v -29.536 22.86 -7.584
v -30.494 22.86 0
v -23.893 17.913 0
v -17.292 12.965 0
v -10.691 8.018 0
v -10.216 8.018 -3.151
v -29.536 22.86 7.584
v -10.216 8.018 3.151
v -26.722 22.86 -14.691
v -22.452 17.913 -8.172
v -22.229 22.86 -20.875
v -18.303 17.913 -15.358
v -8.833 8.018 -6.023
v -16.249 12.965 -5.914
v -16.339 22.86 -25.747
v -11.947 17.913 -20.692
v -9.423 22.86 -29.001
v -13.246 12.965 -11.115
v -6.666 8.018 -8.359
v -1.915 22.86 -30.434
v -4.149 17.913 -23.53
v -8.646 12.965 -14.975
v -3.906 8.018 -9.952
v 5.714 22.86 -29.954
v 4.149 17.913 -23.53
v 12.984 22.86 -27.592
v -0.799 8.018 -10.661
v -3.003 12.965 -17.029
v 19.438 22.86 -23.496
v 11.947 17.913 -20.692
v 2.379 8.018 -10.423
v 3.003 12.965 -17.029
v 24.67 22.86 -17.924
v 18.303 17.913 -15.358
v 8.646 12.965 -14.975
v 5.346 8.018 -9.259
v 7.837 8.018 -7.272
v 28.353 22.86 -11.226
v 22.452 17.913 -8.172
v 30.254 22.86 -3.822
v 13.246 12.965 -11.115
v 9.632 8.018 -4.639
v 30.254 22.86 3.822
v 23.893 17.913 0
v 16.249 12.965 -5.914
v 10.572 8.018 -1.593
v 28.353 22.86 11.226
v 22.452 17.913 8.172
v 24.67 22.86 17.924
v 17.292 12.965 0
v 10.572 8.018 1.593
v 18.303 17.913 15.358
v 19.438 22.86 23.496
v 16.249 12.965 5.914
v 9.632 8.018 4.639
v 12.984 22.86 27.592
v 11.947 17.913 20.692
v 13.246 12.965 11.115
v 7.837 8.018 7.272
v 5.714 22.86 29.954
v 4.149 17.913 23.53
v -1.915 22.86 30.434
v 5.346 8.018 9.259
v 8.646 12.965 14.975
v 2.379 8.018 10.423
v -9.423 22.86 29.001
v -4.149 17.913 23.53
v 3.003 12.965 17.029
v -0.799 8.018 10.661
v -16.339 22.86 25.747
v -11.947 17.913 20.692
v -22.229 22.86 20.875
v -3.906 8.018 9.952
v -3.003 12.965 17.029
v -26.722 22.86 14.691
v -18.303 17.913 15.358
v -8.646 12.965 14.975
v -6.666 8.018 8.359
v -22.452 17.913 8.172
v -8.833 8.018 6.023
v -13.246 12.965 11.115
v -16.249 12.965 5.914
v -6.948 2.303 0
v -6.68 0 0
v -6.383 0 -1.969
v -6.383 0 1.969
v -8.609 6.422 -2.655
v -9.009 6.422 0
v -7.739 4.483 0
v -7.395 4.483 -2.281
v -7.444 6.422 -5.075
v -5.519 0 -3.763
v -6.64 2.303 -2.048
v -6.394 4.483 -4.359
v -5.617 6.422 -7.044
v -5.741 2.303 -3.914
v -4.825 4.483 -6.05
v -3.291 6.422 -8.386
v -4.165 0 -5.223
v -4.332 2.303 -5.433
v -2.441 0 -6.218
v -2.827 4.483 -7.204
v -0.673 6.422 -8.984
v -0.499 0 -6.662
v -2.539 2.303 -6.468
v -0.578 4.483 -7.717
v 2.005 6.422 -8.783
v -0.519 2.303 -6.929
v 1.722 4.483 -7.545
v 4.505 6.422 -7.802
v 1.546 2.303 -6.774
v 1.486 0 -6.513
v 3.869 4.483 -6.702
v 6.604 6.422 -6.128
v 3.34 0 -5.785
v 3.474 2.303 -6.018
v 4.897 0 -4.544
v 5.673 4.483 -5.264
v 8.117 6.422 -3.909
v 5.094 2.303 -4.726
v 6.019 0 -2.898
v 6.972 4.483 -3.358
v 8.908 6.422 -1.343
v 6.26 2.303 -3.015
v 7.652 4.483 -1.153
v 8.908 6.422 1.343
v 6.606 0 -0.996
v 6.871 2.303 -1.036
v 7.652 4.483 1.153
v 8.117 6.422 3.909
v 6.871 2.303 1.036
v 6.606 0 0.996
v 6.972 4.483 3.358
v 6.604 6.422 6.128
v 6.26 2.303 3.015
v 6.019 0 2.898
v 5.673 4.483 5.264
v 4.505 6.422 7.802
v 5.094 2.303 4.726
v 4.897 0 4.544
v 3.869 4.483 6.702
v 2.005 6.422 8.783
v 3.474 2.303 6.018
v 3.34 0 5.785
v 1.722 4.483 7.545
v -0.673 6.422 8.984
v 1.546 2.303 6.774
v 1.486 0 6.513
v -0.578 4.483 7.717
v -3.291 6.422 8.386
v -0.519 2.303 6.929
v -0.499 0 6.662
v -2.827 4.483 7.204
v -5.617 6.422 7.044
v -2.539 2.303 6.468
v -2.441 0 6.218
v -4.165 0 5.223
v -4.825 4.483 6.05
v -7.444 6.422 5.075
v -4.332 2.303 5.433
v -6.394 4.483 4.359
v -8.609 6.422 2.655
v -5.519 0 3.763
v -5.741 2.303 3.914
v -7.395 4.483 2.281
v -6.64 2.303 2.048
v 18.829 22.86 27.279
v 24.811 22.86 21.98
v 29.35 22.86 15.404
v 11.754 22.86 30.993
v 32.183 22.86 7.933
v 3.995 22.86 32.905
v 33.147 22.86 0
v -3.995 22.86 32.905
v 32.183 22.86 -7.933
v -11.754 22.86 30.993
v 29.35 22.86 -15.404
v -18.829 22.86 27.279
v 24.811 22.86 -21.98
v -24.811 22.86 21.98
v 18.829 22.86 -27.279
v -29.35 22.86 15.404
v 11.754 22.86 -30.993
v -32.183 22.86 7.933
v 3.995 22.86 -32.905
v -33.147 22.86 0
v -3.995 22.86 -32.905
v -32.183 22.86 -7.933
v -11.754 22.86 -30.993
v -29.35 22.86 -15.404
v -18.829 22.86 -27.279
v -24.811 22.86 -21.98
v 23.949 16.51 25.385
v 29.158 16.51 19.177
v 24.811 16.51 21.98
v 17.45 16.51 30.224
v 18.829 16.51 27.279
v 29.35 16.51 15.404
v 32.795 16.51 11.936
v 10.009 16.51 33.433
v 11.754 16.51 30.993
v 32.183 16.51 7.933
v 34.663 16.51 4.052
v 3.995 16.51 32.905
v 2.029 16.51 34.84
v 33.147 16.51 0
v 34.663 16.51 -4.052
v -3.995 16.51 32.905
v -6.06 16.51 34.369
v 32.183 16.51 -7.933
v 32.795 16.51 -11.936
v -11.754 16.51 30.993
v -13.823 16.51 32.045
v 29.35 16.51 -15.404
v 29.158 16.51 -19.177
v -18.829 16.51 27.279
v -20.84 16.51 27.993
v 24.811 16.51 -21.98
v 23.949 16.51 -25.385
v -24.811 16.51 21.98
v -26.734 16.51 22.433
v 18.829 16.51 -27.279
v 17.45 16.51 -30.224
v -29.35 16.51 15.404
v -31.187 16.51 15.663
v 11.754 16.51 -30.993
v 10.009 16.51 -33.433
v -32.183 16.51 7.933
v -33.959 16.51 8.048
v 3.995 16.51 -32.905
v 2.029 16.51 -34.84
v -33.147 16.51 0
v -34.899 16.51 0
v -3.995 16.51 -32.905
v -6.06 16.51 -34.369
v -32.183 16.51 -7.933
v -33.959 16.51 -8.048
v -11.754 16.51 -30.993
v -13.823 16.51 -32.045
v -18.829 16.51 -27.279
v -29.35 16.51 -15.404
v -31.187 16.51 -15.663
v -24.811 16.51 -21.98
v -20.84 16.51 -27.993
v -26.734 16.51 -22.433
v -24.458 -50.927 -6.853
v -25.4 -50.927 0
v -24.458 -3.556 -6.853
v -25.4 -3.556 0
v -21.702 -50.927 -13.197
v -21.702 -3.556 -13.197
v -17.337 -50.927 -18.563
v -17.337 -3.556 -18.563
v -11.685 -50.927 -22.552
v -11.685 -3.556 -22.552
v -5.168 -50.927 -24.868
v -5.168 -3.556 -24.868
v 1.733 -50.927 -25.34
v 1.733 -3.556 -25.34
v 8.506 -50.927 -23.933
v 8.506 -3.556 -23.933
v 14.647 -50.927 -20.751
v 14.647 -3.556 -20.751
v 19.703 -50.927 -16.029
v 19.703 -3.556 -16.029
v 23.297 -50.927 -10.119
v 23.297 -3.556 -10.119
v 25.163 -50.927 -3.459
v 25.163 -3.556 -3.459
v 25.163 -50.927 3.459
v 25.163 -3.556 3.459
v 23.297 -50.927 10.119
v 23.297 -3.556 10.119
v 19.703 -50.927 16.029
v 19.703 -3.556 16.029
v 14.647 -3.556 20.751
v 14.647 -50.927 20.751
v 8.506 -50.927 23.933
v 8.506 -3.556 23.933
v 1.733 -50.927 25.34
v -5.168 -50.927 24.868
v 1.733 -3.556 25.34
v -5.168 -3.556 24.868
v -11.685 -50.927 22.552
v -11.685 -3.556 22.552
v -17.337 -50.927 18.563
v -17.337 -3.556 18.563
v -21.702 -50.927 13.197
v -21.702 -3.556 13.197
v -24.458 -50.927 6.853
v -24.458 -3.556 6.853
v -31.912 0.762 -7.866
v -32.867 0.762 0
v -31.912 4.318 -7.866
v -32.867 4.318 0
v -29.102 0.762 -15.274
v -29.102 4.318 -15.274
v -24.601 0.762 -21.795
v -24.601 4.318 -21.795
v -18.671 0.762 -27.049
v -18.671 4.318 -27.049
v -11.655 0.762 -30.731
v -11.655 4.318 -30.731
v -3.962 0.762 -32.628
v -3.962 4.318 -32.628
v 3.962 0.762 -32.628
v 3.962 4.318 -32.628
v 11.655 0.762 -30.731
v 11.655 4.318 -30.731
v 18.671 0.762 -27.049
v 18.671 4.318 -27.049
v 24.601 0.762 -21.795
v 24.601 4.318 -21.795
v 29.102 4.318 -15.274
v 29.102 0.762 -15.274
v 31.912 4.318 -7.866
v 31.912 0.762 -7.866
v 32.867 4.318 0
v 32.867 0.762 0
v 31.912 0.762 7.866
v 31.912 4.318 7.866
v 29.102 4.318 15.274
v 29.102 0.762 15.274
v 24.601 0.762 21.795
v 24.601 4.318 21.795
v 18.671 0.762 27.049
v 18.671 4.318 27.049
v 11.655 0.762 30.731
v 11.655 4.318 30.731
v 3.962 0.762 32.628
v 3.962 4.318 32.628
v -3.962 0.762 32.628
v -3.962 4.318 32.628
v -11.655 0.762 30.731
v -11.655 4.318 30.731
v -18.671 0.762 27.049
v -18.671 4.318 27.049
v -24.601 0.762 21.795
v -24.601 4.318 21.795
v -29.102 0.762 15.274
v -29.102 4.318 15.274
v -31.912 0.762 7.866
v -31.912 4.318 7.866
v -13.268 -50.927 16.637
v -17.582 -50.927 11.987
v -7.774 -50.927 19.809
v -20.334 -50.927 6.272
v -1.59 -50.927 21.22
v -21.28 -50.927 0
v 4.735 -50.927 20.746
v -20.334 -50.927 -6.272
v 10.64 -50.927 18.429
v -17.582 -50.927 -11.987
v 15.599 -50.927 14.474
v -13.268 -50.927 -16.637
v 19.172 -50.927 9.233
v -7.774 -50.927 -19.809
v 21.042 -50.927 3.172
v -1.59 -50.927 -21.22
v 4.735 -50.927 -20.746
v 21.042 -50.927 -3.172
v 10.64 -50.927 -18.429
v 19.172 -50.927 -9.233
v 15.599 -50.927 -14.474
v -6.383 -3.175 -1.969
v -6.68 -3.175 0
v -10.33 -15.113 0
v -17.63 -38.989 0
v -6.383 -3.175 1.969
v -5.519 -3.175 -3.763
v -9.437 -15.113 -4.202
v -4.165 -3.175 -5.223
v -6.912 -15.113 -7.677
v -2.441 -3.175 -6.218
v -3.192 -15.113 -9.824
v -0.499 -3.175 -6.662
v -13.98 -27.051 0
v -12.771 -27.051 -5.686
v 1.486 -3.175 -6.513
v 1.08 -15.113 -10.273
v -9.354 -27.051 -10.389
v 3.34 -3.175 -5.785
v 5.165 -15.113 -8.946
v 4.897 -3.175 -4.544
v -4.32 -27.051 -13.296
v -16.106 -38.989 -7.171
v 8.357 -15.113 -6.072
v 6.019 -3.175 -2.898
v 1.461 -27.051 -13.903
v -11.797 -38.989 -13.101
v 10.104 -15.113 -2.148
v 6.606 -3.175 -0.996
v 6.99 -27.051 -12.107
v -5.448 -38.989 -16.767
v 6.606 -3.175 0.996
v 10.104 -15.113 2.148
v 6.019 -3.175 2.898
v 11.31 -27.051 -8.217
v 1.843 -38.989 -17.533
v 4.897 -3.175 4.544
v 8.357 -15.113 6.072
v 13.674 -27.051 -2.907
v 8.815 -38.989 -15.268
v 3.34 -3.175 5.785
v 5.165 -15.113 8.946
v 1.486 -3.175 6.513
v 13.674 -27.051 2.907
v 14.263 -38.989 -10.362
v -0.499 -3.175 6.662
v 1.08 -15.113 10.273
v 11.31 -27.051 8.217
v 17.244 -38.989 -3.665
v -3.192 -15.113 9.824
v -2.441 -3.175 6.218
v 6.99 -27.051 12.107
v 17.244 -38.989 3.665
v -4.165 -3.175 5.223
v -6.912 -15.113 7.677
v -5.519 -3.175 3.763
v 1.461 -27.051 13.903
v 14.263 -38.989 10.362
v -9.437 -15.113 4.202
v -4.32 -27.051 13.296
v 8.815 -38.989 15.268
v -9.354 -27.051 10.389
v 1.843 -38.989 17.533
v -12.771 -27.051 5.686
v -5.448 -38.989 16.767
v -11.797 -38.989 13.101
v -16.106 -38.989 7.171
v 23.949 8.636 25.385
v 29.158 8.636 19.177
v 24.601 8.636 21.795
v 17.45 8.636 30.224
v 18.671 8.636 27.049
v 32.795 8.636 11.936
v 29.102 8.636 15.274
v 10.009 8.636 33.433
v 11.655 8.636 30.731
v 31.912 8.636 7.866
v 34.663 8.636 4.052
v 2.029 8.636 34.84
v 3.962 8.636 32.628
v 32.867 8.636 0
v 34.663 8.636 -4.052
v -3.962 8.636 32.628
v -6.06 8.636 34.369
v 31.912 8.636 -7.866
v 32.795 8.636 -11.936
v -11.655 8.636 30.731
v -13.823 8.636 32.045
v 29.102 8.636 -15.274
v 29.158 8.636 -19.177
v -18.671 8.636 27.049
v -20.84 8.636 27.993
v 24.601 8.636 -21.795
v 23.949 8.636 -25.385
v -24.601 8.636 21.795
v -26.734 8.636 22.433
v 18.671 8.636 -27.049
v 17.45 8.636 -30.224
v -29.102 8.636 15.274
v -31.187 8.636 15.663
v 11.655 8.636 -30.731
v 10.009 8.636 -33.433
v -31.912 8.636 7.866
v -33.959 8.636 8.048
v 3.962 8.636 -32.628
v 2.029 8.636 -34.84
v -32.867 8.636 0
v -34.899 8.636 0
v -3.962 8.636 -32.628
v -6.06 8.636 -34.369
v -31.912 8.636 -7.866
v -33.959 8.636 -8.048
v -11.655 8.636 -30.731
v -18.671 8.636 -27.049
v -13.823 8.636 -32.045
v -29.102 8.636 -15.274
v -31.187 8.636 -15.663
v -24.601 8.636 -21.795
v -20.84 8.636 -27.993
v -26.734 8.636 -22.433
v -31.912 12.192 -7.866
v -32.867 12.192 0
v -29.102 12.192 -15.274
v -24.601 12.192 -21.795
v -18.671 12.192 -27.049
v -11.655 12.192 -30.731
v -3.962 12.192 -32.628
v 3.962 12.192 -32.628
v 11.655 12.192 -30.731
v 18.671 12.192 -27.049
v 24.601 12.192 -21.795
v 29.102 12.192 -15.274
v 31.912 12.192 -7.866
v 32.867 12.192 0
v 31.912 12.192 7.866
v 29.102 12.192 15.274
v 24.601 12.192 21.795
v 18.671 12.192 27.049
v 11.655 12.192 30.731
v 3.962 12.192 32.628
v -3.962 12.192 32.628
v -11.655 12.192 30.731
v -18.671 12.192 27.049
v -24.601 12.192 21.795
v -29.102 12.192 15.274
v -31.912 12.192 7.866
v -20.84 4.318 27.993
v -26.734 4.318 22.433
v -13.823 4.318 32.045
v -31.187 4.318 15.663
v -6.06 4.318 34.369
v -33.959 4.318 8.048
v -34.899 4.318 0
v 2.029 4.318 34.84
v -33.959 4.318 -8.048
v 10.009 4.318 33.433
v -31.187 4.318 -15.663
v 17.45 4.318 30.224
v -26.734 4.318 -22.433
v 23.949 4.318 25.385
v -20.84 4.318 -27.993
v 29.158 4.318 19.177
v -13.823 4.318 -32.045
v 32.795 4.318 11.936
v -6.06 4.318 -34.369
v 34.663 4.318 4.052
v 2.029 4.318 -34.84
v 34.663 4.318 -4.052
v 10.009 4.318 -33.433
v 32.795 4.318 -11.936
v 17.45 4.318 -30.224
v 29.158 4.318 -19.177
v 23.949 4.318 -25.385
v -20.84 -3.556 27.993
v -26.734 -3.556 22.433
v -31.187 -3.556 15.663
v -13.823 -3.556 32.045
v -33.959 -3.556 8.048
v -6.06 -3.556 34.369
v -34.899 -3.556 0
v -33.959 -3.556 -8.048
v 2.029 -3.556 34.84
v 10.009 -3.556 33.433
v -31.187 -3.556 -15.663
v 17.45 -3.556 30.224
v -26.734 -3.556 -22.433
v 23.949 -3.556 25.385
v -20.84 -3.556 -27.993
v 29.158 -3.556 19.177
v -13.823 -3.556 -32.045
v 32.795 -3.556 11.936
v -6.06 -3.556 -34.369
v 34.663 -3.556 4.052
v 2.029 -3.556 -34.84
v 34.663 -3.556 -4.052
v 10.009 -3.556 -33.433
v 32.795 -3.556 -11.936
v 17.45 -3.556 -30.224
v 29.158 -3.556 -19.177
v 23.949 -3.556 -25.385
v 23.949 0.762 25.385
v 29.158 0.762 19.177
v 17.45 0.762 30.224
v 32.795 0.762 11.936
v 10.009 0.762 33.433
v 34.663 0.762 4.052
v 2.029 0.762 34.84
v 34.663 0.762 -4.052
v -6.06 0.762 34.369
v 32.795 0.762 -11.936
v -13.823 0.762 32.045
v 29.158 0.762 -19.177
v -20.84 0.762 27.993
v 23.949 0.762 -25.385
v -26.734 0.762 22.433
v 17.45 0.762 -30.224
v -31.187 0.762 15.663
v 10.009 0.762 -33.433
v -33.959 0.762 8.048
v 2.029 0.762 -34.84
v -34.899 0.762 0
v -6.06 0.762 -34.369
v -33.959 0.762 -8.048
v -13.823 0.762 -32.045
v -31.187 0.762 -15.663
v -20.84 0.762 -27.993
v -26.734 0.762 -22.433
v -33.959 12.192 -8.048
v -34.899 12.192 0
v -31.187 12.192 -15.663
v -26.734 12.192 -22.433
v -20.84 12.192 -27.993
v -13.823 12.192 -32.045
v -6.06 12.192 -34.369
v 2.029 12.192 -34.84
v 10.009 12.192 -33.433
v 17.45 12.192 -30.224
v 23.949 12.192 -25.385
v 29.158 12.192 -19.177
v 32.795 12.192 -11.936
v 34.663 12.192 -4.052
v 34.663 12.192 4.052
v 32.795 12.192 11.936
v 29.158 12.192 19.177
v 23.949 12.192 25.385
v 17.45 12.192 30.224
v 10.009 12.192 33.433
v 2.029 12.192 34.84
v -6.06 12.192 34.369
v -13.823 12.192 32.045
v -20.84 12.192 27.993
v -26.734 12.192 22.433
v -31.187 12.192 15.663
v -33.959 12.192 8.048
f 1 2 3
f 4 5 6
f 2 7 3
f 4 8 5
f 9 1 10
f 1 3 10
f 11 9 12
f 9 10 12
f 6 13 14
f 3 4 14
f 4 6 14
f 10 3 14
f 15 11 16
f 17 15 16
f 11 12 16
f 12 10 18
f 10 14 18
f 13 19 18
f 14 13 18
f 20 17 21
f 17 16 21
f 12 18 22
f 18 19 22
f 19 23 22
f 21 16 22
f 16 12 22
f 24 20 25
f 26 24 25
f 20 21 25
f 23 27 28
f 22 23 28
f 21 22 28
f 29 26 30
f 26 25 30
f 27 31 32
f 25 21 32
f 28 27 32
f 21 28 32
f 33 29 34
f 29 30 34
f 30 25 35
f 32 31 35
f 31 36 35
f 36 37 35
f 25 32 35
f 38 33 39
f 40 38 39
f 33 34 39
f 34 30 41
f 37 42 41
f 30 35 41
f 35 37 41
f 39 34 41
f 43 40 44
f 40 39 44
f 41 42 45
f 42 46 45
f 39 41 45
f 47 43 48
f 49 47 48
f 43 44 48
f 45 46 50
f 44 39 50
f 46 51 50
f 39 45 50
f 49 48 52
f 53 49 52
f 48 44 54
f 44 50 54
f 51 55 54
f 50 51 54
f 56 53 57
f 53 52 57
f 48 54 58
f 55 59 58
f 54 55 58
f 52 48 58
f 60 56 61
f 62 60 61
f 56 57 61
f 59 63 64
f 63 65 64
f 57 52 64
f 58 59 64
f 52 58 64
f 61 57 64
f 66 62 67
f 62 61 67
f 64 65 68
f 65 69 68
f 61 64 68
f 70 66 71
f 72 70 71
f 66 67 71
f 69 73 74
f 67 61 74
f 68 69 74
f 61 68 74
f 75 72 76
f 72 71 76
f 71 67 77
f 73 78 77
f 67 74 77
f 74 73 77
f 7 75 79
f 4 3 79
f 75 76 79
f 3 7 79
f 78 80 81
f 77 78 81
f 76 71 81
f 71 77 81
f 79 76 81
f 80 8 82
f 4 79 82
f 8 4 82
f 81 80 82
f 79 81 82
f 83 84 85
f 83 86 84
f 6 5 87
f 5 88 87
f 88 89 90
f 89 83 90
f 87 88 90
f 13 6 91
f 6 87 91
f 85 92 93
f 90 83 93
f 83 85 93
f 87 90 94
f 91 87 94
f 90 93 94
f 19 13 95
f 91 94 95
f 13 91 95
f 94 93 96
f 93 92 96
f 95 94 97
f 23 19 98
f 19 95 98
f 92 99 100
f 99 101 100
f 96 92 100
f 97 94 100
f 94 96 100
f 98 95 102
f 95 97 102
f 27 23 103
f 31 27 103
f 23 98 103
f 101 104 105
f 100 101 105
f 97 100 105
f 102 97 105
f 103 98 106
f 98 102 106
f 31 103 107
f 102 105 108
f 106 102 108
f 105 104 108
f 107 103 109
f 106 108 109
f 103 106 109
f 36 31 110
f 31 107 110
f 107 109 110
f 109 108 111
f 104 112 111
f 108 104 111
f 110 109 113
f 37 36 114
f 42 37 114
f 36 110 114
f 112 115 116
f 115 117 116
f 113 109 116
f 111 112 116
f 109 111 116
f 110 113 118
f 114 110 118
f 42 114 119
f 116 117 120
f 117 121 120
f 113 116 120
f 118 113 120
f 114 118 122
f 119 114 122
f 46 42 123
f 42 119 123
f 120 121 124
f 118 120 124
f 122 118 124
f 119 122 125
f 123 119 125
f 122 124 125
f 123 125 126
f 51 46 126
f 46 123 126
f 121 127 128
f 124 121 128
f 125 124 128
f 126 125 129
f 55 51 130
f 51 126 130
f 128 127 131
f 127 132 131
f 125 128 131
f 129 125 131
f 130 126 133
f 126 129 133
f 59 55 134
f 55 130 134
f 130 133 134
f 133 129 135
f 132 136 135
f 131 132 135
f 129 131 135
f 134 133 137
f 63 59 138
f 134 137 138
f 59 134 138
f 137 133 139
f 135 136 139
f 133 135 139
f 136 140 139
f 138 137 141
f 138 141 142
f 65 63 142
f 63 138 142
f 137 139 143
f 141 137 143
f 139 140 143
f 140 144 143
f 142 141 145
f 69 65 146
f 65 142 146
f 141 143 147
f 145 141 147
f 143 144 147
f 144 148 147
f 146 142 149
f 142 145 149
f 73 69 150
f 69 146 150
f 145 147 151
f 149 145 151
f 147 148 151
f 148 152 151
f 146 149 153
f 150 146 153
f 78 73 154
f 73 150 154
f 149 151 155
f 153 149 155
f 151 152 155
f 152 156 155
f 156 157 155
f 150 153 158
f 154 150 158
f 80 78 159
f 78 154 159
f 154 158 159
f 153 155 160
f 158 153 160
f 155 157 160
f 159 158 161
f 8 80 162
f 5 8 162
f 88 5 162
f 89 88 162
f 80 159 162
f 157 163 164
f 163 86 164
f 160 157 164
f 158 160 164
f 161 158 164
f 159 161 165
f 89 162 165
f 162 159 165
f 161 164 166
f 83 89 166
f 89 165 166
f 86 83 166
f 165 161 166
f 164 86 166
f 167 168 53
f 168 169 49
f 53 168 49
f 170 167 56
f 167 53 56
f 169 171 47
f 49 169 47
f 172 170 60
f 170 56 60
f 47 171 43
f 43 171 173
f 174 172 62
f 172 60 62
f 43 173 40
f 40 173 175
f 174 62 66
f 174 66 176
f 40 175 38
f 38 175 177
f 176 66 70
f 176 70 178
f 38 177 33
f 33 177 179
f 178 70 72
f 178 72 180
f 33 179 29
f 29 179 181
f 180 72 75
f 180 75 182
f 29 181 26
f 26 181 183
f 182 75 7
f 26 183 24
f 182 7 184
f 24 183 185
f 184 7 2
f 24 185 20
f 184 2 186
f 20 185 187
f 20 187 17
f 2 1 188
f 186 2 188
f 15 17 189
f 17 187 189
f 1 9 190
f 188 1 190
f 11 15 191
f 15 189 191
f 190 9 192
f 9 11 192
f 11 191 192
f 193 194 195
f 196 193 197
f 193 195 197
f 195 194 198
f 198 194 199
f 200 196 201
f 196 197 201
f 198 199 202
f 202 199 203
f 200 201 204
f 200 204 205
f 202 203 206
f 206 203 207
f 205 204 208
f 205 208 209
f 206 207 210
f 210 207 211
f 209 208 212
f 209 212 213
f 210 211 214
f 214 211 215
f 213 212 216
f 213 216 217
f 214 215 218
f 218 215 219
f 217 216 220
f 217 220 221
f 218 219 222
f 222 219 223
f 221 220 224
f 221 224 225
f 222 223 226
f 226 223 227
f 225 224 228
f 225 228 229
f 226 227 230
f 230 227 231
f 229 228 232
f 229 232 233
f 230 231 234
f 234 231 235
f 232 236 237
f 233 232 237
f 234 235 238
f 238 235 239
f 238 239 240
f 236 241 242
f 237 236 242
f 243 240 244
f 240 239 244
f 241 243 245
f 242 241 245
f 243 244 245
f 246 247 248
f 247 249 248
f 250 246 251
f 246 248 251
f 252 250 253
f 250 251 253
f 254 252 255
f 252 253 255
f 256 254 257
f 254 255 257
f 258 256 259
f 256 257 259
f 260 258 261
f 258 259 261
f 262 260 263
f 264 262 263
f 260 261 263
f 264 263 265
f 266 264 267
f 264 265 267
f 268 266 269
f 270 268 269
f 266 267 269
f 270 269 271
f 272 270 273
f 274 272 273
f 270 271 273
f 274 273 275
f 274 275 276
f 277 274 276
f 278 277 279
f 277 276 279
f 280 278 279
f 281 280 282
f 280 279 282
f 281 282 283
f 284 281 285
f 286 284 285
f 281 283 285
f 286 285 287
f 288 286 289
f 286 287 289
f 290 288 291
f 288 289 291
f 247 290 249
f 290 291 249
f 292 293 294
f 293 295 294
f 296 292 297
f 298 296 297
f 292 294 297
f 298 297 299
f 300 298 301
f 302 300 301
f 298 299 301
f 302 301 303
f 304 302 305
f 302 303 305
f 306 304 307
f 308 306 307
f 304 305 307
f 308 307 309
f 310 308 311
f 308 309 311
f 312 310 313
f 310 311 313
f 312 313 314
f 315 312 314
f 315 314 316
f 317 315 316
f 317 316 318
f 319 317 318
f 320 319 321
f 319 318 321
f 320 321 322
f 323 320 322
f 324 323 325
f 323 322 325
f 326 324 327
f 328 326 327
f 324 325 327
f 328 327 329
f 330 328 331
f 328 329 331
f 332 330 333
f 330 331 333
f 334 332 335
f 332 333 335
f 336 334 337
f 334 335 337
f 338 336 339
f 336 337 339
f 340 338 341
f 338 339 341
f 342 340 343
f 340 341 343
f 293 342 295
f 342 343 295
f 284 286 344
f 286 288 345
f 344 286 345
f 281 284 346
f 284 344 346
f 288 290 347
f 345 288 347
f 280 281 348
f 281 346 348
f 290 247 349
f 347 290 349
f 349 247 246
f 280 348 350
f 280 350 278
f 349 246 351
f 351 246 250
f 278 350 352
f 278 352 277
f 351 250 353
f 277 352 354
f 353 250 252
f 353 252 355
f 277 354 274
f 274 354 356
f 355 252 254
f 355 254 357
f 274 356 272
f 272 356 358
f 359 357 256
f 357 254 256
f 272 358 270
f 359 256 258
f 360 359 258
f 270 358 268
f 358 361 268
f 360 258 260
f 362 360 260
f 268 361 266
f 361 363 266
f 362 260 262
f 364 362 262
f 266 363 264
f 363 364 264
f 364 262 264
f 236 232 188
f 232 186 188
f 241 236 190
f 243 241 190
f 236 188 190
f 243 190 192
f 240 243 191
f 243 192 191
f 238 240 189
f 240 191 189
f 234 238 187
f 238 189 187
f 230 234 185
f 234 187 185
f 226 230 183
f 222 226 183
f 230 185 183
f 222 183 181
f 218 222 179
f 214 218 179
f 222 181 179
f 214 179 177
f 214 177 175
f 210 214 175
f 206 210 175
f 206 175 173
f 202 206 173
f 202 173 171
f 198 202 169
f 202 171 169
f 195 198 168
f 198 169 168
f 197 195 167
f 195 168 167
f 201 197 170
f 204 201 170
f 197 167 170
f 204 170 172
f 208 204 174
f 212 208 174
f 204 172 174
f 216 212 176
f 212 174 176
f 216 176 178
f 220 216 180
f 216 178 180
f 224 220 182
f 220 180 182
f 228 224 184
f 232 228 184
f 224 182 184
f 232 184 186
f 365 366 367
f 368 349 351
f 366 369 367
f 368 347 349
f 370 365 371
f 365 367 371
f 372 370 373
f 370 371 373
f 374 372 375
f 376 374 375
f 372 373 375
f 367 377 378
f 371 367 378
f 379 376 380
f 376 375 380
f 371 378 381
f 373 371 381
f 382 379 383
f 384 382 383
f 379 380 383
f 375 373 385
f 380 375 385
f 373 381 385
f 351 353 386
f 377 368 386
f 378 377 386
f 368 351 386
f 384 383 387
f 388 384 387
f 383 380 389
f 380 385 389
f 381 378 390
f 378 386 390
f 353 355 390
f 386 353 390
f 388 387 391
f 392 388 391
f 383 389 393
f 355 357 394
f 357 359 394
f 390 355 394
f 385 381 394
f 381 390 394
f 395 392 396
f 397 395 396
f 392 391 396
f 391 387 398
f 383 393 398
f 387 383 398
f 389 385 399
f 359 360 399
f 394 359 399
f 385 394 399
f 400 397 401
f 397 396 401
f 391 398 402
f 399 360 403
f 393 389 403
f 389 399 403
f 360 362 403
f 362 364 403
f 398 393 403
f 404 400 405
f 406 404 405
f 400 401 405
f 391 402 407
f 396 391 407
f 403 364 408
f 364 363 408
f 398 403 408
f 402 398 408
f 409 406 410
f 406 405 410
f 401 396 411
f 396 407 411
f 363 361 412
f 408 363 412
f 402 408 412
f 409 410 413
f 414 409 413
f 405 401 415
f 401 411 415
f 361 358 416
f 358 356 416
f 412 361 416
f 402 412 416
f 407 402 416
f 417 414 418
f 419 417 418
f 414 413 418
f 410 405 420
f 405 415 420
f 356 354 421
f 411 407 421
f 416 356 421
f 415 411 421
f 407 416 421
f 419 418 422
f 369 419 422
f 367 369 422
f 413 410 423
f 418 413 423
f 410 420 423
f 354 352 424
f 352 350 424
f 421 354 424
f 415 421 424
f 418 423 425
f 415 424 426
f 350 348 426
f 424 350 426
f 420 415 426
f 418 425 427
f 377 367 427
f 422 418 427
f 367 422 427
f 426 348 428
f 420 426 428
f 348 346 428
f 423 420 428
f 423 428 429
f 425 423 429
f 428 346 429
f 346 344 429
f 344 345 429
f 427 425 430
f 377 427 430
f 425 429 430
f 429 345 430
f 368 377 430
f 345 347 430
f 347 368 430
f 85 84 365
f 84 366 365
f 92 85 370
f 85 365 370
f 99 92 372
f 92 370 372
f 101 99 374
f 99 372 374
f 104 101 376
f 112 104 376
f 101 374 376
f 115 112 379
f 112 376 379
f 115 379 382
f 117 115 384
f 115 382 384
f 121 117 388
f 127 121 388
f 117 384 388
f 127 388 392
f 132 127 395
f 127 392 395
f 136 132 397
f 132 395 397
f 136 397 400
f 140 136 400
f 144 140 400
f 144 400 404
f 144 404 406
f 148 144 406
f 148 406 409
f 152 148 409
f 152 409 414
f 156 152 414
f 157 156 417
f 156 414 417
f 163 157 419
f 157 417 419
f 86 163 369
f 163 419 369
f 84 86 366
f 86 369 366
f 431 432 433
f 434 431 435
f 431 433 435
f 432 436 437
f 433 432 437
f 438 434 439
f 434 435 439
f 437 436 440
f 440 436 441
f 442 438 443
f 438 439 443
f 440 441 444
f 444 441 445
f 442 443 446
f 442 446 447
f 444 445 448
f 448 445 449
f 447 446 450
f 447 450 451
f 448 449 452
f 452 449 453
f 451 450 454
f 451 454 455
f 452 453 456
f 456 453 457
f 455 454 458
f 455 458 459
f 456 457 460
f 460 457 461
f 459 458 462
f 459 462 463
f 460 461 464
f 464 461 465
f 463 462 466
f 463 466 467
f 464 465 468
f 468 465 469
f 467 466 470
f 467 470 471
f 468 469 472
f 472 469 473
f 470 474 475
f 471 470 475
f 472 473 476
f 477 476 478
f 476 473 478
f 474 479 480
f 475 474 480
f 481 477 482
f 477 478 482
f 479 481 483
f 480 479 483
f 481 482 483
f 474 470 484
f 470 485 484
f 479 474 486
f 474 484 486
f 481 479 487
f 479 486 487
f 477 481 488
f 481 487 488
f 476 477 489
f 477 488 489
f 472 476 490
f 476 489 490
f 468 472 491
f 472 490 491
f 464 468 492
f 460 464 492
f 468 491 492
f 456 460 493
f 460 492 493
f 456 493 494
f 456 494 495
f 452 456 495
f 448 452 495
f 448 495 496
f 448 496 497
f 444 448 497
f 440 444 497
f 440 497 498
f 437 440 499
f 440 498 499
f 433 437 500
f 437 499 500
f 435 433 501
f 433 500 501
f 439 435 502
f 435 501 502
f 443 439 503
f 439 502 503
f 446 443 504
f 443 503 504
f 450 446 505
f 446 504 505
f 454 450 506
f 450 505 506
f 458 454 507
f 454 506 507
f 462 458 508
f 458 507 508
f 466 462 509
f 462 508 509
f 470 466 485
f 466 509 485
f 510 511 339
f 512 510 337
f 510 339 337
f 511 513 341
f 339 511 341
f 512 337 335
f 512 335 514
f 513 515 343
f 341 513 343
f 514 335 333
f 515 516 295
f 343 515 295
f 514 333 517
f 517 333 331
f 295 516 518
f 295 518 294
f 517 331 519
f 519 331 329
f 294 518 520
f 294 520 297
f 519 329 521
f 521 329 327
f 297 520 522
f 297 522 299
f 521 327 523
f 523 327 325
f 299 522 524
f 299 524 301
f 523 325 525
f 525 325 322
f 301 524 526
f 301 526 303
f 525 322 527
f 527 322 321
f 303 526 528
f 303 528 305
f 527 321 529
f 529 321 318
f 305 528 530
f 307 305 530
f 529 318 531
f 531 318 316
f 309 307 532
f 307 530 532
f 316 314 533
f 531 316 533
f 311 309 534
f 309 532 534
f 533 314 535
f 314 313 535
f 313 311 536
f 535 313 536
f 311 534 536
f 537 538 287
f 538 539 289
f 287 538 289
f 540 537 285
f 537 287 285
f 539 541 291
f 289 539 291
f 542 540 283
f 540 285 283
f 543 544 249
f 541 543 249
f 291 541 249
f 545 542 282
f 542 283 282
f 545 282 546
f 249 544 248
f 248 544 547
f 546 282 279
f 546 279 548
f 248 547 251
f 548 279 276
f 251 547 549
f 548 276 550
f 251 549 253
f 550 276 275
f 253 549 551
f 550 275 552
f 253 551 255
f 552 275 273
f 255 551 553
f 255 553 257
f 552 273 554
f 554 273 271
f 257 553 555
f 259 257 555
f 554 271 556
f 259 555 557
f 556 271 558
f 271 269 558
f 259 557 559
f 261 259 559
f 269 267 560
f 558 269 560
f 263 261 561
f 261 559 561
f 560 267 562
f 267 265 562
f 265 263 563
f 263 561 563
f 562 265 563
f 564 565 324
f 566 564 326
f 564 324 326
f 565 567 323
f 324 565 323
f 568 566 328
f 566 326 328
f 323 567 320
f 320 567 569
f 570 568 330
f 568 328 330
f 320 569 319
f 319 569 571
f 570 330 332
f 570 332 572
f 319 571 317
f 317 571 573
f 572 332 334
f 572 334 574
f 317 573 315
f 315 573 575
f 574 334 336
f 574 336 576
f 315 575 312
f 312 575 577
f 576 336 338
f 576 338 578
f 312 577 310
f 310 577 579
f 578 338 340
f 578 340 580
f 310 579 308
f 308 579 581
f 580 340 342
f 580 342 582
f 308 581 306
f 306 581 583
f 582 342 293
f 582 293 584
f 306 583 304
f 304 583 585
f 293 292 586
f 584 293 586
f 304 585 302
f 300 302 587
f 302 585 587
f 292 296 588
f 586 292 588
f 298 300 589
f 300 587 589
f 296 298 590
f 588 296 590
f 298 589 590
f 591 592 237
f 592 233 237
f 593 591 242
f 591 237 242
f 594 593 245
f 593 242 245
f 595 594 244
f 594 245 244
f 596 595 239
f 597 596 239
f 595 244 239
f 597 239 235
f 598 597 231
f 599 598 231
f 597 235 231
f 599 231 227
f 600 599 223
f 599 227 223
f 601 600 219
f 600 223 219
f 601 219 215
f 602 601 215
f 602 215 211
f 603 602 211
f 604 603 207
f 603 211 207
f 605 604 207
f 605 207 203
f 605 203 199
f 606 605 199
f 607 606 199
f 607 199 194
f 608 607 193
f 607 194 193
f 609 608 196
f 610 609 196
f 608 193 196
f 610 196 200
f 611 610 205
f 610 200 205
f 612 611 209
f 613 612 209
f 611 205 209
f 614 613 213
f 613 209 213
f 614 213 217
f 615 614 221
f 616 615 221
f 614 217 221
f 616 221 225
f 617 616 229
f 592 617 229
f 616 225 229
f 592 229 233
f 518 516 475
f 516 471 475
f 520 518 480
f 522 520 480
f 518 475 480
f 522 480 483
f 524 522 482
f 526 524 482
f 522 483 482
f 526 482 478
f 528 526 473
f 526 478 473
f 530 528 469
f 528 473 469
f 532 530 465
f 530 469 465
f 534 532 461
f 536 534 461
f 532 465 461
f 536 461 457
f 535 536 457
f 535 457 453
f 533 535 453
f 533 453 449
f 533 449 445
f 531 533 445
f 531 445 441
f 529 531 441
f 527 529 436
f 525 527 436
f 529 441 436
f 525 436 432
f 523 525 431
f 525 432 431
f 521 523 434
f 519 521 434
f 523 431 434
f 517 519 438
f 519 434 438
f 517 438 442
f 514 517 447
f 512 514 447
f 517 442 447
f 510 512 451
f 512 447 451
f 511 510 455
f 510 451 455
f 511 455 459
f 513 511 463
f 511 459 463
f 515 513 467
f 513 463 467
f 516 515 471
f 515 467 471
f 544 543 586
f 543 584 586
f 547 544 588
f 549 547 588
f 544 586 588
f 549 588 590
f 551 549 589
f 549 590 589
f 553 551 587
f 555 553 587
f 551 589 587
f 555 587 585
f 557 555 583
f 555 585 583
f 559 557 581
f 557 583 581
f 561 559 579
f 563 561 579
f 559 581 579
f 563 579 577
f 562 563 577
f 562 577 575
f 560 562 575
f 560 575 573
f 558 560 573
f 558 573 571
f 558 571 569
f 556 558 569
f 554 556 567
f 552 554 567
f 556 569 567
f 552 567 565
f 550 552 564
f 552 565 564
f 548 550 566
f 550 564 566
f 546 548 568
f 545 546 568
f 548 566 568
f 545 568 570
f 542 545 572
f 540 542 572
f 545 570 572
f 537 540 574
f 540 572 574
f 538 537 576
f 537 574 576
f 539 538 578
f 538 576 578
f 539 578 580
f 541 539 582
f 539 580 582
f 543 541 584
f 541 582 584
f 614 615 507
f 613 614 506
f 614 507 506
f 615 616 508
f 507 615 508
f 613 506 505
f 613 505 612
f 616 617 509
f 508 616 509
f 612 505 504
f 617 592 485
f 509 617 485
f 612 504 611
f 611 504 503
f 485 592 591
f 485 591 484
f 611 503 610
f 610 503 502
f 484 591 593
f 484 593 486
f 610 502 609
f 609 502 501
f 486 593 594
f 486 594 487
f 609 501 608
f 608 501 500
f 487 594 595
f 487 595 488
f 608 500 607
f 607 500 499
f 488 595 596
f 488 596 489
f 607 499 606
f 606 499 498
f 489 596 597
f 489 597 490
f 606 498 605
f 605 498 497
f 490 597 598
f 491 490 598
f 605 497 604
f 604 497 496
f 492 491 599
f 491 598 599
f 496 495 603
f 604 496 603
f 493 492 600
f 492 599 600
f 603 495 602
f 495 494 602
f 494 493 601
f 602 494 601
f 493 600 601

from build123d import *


with BuildPart() as part:
    # Sketch1 → Revolve1 (revolve)
    with BuildSketch(Plane.XY):
        with BuildLine():
            Line((-6.6802, 0), (-6.6802, -3.175))
            Line((-6.6802, -3.175), (-21.279532816, -50.92726597))
            Line((-21.279532816, -50.92726597), (-25.3996444, -50.92726597))
            Line((-25.3996444, -50.92726597), (-25.3996444, -3.55626597))
            Line((-25.3996444, -3.55626597), (-34.8992444, -3.55626597))
            Line((-34.8992444, -3.55626597), (-34.8992444, 0.76173403))
            Line((-34.8992444, 0.76173403), (-32.8672444, 0.76173403))
            Line((-32.8672444, 0.76173403), (-32.8672444, 4.31773403))
            Line((-32.8672444, 4.31773403), (-34.8992444, 4.31773403))
            Line((-34.8992444, 4.31773403), (-34.8992444, 8.63573403))
            Line((-34.8992444, 8.63573403), (-32.8672444, 8.63573403))
            Line((-32.8672444, 8.63573403), (-32.8672444, 12.19173403))
            Line((-32.8672444, 12.19173403), (-34.8992444, 12.19173403))
            Line((-34.8992444, 12.19173403), (-34.8992444, 16.50973403))
            Line((-34.8992444, 16.50973403), (-33.1466444, 16.50973403))
            Line((-33.1466444, 16.50973403), (-33.1466444, 22.85973403))
            Line((-33.1466444, 22.85973403), (-30.49397, 22.85973403))
            Line((-30.49397, 22.85973403), (-10.691104238, 8.018327423))
            ThreePointArc((-10.691104238, 8.018327423), (-7.73884947, 4.482770557), (-6.6802, 0))
        make_face()
    revolve(axis=Axis((0, 0, 0), (0, -1, 0)))


solid = part.part
